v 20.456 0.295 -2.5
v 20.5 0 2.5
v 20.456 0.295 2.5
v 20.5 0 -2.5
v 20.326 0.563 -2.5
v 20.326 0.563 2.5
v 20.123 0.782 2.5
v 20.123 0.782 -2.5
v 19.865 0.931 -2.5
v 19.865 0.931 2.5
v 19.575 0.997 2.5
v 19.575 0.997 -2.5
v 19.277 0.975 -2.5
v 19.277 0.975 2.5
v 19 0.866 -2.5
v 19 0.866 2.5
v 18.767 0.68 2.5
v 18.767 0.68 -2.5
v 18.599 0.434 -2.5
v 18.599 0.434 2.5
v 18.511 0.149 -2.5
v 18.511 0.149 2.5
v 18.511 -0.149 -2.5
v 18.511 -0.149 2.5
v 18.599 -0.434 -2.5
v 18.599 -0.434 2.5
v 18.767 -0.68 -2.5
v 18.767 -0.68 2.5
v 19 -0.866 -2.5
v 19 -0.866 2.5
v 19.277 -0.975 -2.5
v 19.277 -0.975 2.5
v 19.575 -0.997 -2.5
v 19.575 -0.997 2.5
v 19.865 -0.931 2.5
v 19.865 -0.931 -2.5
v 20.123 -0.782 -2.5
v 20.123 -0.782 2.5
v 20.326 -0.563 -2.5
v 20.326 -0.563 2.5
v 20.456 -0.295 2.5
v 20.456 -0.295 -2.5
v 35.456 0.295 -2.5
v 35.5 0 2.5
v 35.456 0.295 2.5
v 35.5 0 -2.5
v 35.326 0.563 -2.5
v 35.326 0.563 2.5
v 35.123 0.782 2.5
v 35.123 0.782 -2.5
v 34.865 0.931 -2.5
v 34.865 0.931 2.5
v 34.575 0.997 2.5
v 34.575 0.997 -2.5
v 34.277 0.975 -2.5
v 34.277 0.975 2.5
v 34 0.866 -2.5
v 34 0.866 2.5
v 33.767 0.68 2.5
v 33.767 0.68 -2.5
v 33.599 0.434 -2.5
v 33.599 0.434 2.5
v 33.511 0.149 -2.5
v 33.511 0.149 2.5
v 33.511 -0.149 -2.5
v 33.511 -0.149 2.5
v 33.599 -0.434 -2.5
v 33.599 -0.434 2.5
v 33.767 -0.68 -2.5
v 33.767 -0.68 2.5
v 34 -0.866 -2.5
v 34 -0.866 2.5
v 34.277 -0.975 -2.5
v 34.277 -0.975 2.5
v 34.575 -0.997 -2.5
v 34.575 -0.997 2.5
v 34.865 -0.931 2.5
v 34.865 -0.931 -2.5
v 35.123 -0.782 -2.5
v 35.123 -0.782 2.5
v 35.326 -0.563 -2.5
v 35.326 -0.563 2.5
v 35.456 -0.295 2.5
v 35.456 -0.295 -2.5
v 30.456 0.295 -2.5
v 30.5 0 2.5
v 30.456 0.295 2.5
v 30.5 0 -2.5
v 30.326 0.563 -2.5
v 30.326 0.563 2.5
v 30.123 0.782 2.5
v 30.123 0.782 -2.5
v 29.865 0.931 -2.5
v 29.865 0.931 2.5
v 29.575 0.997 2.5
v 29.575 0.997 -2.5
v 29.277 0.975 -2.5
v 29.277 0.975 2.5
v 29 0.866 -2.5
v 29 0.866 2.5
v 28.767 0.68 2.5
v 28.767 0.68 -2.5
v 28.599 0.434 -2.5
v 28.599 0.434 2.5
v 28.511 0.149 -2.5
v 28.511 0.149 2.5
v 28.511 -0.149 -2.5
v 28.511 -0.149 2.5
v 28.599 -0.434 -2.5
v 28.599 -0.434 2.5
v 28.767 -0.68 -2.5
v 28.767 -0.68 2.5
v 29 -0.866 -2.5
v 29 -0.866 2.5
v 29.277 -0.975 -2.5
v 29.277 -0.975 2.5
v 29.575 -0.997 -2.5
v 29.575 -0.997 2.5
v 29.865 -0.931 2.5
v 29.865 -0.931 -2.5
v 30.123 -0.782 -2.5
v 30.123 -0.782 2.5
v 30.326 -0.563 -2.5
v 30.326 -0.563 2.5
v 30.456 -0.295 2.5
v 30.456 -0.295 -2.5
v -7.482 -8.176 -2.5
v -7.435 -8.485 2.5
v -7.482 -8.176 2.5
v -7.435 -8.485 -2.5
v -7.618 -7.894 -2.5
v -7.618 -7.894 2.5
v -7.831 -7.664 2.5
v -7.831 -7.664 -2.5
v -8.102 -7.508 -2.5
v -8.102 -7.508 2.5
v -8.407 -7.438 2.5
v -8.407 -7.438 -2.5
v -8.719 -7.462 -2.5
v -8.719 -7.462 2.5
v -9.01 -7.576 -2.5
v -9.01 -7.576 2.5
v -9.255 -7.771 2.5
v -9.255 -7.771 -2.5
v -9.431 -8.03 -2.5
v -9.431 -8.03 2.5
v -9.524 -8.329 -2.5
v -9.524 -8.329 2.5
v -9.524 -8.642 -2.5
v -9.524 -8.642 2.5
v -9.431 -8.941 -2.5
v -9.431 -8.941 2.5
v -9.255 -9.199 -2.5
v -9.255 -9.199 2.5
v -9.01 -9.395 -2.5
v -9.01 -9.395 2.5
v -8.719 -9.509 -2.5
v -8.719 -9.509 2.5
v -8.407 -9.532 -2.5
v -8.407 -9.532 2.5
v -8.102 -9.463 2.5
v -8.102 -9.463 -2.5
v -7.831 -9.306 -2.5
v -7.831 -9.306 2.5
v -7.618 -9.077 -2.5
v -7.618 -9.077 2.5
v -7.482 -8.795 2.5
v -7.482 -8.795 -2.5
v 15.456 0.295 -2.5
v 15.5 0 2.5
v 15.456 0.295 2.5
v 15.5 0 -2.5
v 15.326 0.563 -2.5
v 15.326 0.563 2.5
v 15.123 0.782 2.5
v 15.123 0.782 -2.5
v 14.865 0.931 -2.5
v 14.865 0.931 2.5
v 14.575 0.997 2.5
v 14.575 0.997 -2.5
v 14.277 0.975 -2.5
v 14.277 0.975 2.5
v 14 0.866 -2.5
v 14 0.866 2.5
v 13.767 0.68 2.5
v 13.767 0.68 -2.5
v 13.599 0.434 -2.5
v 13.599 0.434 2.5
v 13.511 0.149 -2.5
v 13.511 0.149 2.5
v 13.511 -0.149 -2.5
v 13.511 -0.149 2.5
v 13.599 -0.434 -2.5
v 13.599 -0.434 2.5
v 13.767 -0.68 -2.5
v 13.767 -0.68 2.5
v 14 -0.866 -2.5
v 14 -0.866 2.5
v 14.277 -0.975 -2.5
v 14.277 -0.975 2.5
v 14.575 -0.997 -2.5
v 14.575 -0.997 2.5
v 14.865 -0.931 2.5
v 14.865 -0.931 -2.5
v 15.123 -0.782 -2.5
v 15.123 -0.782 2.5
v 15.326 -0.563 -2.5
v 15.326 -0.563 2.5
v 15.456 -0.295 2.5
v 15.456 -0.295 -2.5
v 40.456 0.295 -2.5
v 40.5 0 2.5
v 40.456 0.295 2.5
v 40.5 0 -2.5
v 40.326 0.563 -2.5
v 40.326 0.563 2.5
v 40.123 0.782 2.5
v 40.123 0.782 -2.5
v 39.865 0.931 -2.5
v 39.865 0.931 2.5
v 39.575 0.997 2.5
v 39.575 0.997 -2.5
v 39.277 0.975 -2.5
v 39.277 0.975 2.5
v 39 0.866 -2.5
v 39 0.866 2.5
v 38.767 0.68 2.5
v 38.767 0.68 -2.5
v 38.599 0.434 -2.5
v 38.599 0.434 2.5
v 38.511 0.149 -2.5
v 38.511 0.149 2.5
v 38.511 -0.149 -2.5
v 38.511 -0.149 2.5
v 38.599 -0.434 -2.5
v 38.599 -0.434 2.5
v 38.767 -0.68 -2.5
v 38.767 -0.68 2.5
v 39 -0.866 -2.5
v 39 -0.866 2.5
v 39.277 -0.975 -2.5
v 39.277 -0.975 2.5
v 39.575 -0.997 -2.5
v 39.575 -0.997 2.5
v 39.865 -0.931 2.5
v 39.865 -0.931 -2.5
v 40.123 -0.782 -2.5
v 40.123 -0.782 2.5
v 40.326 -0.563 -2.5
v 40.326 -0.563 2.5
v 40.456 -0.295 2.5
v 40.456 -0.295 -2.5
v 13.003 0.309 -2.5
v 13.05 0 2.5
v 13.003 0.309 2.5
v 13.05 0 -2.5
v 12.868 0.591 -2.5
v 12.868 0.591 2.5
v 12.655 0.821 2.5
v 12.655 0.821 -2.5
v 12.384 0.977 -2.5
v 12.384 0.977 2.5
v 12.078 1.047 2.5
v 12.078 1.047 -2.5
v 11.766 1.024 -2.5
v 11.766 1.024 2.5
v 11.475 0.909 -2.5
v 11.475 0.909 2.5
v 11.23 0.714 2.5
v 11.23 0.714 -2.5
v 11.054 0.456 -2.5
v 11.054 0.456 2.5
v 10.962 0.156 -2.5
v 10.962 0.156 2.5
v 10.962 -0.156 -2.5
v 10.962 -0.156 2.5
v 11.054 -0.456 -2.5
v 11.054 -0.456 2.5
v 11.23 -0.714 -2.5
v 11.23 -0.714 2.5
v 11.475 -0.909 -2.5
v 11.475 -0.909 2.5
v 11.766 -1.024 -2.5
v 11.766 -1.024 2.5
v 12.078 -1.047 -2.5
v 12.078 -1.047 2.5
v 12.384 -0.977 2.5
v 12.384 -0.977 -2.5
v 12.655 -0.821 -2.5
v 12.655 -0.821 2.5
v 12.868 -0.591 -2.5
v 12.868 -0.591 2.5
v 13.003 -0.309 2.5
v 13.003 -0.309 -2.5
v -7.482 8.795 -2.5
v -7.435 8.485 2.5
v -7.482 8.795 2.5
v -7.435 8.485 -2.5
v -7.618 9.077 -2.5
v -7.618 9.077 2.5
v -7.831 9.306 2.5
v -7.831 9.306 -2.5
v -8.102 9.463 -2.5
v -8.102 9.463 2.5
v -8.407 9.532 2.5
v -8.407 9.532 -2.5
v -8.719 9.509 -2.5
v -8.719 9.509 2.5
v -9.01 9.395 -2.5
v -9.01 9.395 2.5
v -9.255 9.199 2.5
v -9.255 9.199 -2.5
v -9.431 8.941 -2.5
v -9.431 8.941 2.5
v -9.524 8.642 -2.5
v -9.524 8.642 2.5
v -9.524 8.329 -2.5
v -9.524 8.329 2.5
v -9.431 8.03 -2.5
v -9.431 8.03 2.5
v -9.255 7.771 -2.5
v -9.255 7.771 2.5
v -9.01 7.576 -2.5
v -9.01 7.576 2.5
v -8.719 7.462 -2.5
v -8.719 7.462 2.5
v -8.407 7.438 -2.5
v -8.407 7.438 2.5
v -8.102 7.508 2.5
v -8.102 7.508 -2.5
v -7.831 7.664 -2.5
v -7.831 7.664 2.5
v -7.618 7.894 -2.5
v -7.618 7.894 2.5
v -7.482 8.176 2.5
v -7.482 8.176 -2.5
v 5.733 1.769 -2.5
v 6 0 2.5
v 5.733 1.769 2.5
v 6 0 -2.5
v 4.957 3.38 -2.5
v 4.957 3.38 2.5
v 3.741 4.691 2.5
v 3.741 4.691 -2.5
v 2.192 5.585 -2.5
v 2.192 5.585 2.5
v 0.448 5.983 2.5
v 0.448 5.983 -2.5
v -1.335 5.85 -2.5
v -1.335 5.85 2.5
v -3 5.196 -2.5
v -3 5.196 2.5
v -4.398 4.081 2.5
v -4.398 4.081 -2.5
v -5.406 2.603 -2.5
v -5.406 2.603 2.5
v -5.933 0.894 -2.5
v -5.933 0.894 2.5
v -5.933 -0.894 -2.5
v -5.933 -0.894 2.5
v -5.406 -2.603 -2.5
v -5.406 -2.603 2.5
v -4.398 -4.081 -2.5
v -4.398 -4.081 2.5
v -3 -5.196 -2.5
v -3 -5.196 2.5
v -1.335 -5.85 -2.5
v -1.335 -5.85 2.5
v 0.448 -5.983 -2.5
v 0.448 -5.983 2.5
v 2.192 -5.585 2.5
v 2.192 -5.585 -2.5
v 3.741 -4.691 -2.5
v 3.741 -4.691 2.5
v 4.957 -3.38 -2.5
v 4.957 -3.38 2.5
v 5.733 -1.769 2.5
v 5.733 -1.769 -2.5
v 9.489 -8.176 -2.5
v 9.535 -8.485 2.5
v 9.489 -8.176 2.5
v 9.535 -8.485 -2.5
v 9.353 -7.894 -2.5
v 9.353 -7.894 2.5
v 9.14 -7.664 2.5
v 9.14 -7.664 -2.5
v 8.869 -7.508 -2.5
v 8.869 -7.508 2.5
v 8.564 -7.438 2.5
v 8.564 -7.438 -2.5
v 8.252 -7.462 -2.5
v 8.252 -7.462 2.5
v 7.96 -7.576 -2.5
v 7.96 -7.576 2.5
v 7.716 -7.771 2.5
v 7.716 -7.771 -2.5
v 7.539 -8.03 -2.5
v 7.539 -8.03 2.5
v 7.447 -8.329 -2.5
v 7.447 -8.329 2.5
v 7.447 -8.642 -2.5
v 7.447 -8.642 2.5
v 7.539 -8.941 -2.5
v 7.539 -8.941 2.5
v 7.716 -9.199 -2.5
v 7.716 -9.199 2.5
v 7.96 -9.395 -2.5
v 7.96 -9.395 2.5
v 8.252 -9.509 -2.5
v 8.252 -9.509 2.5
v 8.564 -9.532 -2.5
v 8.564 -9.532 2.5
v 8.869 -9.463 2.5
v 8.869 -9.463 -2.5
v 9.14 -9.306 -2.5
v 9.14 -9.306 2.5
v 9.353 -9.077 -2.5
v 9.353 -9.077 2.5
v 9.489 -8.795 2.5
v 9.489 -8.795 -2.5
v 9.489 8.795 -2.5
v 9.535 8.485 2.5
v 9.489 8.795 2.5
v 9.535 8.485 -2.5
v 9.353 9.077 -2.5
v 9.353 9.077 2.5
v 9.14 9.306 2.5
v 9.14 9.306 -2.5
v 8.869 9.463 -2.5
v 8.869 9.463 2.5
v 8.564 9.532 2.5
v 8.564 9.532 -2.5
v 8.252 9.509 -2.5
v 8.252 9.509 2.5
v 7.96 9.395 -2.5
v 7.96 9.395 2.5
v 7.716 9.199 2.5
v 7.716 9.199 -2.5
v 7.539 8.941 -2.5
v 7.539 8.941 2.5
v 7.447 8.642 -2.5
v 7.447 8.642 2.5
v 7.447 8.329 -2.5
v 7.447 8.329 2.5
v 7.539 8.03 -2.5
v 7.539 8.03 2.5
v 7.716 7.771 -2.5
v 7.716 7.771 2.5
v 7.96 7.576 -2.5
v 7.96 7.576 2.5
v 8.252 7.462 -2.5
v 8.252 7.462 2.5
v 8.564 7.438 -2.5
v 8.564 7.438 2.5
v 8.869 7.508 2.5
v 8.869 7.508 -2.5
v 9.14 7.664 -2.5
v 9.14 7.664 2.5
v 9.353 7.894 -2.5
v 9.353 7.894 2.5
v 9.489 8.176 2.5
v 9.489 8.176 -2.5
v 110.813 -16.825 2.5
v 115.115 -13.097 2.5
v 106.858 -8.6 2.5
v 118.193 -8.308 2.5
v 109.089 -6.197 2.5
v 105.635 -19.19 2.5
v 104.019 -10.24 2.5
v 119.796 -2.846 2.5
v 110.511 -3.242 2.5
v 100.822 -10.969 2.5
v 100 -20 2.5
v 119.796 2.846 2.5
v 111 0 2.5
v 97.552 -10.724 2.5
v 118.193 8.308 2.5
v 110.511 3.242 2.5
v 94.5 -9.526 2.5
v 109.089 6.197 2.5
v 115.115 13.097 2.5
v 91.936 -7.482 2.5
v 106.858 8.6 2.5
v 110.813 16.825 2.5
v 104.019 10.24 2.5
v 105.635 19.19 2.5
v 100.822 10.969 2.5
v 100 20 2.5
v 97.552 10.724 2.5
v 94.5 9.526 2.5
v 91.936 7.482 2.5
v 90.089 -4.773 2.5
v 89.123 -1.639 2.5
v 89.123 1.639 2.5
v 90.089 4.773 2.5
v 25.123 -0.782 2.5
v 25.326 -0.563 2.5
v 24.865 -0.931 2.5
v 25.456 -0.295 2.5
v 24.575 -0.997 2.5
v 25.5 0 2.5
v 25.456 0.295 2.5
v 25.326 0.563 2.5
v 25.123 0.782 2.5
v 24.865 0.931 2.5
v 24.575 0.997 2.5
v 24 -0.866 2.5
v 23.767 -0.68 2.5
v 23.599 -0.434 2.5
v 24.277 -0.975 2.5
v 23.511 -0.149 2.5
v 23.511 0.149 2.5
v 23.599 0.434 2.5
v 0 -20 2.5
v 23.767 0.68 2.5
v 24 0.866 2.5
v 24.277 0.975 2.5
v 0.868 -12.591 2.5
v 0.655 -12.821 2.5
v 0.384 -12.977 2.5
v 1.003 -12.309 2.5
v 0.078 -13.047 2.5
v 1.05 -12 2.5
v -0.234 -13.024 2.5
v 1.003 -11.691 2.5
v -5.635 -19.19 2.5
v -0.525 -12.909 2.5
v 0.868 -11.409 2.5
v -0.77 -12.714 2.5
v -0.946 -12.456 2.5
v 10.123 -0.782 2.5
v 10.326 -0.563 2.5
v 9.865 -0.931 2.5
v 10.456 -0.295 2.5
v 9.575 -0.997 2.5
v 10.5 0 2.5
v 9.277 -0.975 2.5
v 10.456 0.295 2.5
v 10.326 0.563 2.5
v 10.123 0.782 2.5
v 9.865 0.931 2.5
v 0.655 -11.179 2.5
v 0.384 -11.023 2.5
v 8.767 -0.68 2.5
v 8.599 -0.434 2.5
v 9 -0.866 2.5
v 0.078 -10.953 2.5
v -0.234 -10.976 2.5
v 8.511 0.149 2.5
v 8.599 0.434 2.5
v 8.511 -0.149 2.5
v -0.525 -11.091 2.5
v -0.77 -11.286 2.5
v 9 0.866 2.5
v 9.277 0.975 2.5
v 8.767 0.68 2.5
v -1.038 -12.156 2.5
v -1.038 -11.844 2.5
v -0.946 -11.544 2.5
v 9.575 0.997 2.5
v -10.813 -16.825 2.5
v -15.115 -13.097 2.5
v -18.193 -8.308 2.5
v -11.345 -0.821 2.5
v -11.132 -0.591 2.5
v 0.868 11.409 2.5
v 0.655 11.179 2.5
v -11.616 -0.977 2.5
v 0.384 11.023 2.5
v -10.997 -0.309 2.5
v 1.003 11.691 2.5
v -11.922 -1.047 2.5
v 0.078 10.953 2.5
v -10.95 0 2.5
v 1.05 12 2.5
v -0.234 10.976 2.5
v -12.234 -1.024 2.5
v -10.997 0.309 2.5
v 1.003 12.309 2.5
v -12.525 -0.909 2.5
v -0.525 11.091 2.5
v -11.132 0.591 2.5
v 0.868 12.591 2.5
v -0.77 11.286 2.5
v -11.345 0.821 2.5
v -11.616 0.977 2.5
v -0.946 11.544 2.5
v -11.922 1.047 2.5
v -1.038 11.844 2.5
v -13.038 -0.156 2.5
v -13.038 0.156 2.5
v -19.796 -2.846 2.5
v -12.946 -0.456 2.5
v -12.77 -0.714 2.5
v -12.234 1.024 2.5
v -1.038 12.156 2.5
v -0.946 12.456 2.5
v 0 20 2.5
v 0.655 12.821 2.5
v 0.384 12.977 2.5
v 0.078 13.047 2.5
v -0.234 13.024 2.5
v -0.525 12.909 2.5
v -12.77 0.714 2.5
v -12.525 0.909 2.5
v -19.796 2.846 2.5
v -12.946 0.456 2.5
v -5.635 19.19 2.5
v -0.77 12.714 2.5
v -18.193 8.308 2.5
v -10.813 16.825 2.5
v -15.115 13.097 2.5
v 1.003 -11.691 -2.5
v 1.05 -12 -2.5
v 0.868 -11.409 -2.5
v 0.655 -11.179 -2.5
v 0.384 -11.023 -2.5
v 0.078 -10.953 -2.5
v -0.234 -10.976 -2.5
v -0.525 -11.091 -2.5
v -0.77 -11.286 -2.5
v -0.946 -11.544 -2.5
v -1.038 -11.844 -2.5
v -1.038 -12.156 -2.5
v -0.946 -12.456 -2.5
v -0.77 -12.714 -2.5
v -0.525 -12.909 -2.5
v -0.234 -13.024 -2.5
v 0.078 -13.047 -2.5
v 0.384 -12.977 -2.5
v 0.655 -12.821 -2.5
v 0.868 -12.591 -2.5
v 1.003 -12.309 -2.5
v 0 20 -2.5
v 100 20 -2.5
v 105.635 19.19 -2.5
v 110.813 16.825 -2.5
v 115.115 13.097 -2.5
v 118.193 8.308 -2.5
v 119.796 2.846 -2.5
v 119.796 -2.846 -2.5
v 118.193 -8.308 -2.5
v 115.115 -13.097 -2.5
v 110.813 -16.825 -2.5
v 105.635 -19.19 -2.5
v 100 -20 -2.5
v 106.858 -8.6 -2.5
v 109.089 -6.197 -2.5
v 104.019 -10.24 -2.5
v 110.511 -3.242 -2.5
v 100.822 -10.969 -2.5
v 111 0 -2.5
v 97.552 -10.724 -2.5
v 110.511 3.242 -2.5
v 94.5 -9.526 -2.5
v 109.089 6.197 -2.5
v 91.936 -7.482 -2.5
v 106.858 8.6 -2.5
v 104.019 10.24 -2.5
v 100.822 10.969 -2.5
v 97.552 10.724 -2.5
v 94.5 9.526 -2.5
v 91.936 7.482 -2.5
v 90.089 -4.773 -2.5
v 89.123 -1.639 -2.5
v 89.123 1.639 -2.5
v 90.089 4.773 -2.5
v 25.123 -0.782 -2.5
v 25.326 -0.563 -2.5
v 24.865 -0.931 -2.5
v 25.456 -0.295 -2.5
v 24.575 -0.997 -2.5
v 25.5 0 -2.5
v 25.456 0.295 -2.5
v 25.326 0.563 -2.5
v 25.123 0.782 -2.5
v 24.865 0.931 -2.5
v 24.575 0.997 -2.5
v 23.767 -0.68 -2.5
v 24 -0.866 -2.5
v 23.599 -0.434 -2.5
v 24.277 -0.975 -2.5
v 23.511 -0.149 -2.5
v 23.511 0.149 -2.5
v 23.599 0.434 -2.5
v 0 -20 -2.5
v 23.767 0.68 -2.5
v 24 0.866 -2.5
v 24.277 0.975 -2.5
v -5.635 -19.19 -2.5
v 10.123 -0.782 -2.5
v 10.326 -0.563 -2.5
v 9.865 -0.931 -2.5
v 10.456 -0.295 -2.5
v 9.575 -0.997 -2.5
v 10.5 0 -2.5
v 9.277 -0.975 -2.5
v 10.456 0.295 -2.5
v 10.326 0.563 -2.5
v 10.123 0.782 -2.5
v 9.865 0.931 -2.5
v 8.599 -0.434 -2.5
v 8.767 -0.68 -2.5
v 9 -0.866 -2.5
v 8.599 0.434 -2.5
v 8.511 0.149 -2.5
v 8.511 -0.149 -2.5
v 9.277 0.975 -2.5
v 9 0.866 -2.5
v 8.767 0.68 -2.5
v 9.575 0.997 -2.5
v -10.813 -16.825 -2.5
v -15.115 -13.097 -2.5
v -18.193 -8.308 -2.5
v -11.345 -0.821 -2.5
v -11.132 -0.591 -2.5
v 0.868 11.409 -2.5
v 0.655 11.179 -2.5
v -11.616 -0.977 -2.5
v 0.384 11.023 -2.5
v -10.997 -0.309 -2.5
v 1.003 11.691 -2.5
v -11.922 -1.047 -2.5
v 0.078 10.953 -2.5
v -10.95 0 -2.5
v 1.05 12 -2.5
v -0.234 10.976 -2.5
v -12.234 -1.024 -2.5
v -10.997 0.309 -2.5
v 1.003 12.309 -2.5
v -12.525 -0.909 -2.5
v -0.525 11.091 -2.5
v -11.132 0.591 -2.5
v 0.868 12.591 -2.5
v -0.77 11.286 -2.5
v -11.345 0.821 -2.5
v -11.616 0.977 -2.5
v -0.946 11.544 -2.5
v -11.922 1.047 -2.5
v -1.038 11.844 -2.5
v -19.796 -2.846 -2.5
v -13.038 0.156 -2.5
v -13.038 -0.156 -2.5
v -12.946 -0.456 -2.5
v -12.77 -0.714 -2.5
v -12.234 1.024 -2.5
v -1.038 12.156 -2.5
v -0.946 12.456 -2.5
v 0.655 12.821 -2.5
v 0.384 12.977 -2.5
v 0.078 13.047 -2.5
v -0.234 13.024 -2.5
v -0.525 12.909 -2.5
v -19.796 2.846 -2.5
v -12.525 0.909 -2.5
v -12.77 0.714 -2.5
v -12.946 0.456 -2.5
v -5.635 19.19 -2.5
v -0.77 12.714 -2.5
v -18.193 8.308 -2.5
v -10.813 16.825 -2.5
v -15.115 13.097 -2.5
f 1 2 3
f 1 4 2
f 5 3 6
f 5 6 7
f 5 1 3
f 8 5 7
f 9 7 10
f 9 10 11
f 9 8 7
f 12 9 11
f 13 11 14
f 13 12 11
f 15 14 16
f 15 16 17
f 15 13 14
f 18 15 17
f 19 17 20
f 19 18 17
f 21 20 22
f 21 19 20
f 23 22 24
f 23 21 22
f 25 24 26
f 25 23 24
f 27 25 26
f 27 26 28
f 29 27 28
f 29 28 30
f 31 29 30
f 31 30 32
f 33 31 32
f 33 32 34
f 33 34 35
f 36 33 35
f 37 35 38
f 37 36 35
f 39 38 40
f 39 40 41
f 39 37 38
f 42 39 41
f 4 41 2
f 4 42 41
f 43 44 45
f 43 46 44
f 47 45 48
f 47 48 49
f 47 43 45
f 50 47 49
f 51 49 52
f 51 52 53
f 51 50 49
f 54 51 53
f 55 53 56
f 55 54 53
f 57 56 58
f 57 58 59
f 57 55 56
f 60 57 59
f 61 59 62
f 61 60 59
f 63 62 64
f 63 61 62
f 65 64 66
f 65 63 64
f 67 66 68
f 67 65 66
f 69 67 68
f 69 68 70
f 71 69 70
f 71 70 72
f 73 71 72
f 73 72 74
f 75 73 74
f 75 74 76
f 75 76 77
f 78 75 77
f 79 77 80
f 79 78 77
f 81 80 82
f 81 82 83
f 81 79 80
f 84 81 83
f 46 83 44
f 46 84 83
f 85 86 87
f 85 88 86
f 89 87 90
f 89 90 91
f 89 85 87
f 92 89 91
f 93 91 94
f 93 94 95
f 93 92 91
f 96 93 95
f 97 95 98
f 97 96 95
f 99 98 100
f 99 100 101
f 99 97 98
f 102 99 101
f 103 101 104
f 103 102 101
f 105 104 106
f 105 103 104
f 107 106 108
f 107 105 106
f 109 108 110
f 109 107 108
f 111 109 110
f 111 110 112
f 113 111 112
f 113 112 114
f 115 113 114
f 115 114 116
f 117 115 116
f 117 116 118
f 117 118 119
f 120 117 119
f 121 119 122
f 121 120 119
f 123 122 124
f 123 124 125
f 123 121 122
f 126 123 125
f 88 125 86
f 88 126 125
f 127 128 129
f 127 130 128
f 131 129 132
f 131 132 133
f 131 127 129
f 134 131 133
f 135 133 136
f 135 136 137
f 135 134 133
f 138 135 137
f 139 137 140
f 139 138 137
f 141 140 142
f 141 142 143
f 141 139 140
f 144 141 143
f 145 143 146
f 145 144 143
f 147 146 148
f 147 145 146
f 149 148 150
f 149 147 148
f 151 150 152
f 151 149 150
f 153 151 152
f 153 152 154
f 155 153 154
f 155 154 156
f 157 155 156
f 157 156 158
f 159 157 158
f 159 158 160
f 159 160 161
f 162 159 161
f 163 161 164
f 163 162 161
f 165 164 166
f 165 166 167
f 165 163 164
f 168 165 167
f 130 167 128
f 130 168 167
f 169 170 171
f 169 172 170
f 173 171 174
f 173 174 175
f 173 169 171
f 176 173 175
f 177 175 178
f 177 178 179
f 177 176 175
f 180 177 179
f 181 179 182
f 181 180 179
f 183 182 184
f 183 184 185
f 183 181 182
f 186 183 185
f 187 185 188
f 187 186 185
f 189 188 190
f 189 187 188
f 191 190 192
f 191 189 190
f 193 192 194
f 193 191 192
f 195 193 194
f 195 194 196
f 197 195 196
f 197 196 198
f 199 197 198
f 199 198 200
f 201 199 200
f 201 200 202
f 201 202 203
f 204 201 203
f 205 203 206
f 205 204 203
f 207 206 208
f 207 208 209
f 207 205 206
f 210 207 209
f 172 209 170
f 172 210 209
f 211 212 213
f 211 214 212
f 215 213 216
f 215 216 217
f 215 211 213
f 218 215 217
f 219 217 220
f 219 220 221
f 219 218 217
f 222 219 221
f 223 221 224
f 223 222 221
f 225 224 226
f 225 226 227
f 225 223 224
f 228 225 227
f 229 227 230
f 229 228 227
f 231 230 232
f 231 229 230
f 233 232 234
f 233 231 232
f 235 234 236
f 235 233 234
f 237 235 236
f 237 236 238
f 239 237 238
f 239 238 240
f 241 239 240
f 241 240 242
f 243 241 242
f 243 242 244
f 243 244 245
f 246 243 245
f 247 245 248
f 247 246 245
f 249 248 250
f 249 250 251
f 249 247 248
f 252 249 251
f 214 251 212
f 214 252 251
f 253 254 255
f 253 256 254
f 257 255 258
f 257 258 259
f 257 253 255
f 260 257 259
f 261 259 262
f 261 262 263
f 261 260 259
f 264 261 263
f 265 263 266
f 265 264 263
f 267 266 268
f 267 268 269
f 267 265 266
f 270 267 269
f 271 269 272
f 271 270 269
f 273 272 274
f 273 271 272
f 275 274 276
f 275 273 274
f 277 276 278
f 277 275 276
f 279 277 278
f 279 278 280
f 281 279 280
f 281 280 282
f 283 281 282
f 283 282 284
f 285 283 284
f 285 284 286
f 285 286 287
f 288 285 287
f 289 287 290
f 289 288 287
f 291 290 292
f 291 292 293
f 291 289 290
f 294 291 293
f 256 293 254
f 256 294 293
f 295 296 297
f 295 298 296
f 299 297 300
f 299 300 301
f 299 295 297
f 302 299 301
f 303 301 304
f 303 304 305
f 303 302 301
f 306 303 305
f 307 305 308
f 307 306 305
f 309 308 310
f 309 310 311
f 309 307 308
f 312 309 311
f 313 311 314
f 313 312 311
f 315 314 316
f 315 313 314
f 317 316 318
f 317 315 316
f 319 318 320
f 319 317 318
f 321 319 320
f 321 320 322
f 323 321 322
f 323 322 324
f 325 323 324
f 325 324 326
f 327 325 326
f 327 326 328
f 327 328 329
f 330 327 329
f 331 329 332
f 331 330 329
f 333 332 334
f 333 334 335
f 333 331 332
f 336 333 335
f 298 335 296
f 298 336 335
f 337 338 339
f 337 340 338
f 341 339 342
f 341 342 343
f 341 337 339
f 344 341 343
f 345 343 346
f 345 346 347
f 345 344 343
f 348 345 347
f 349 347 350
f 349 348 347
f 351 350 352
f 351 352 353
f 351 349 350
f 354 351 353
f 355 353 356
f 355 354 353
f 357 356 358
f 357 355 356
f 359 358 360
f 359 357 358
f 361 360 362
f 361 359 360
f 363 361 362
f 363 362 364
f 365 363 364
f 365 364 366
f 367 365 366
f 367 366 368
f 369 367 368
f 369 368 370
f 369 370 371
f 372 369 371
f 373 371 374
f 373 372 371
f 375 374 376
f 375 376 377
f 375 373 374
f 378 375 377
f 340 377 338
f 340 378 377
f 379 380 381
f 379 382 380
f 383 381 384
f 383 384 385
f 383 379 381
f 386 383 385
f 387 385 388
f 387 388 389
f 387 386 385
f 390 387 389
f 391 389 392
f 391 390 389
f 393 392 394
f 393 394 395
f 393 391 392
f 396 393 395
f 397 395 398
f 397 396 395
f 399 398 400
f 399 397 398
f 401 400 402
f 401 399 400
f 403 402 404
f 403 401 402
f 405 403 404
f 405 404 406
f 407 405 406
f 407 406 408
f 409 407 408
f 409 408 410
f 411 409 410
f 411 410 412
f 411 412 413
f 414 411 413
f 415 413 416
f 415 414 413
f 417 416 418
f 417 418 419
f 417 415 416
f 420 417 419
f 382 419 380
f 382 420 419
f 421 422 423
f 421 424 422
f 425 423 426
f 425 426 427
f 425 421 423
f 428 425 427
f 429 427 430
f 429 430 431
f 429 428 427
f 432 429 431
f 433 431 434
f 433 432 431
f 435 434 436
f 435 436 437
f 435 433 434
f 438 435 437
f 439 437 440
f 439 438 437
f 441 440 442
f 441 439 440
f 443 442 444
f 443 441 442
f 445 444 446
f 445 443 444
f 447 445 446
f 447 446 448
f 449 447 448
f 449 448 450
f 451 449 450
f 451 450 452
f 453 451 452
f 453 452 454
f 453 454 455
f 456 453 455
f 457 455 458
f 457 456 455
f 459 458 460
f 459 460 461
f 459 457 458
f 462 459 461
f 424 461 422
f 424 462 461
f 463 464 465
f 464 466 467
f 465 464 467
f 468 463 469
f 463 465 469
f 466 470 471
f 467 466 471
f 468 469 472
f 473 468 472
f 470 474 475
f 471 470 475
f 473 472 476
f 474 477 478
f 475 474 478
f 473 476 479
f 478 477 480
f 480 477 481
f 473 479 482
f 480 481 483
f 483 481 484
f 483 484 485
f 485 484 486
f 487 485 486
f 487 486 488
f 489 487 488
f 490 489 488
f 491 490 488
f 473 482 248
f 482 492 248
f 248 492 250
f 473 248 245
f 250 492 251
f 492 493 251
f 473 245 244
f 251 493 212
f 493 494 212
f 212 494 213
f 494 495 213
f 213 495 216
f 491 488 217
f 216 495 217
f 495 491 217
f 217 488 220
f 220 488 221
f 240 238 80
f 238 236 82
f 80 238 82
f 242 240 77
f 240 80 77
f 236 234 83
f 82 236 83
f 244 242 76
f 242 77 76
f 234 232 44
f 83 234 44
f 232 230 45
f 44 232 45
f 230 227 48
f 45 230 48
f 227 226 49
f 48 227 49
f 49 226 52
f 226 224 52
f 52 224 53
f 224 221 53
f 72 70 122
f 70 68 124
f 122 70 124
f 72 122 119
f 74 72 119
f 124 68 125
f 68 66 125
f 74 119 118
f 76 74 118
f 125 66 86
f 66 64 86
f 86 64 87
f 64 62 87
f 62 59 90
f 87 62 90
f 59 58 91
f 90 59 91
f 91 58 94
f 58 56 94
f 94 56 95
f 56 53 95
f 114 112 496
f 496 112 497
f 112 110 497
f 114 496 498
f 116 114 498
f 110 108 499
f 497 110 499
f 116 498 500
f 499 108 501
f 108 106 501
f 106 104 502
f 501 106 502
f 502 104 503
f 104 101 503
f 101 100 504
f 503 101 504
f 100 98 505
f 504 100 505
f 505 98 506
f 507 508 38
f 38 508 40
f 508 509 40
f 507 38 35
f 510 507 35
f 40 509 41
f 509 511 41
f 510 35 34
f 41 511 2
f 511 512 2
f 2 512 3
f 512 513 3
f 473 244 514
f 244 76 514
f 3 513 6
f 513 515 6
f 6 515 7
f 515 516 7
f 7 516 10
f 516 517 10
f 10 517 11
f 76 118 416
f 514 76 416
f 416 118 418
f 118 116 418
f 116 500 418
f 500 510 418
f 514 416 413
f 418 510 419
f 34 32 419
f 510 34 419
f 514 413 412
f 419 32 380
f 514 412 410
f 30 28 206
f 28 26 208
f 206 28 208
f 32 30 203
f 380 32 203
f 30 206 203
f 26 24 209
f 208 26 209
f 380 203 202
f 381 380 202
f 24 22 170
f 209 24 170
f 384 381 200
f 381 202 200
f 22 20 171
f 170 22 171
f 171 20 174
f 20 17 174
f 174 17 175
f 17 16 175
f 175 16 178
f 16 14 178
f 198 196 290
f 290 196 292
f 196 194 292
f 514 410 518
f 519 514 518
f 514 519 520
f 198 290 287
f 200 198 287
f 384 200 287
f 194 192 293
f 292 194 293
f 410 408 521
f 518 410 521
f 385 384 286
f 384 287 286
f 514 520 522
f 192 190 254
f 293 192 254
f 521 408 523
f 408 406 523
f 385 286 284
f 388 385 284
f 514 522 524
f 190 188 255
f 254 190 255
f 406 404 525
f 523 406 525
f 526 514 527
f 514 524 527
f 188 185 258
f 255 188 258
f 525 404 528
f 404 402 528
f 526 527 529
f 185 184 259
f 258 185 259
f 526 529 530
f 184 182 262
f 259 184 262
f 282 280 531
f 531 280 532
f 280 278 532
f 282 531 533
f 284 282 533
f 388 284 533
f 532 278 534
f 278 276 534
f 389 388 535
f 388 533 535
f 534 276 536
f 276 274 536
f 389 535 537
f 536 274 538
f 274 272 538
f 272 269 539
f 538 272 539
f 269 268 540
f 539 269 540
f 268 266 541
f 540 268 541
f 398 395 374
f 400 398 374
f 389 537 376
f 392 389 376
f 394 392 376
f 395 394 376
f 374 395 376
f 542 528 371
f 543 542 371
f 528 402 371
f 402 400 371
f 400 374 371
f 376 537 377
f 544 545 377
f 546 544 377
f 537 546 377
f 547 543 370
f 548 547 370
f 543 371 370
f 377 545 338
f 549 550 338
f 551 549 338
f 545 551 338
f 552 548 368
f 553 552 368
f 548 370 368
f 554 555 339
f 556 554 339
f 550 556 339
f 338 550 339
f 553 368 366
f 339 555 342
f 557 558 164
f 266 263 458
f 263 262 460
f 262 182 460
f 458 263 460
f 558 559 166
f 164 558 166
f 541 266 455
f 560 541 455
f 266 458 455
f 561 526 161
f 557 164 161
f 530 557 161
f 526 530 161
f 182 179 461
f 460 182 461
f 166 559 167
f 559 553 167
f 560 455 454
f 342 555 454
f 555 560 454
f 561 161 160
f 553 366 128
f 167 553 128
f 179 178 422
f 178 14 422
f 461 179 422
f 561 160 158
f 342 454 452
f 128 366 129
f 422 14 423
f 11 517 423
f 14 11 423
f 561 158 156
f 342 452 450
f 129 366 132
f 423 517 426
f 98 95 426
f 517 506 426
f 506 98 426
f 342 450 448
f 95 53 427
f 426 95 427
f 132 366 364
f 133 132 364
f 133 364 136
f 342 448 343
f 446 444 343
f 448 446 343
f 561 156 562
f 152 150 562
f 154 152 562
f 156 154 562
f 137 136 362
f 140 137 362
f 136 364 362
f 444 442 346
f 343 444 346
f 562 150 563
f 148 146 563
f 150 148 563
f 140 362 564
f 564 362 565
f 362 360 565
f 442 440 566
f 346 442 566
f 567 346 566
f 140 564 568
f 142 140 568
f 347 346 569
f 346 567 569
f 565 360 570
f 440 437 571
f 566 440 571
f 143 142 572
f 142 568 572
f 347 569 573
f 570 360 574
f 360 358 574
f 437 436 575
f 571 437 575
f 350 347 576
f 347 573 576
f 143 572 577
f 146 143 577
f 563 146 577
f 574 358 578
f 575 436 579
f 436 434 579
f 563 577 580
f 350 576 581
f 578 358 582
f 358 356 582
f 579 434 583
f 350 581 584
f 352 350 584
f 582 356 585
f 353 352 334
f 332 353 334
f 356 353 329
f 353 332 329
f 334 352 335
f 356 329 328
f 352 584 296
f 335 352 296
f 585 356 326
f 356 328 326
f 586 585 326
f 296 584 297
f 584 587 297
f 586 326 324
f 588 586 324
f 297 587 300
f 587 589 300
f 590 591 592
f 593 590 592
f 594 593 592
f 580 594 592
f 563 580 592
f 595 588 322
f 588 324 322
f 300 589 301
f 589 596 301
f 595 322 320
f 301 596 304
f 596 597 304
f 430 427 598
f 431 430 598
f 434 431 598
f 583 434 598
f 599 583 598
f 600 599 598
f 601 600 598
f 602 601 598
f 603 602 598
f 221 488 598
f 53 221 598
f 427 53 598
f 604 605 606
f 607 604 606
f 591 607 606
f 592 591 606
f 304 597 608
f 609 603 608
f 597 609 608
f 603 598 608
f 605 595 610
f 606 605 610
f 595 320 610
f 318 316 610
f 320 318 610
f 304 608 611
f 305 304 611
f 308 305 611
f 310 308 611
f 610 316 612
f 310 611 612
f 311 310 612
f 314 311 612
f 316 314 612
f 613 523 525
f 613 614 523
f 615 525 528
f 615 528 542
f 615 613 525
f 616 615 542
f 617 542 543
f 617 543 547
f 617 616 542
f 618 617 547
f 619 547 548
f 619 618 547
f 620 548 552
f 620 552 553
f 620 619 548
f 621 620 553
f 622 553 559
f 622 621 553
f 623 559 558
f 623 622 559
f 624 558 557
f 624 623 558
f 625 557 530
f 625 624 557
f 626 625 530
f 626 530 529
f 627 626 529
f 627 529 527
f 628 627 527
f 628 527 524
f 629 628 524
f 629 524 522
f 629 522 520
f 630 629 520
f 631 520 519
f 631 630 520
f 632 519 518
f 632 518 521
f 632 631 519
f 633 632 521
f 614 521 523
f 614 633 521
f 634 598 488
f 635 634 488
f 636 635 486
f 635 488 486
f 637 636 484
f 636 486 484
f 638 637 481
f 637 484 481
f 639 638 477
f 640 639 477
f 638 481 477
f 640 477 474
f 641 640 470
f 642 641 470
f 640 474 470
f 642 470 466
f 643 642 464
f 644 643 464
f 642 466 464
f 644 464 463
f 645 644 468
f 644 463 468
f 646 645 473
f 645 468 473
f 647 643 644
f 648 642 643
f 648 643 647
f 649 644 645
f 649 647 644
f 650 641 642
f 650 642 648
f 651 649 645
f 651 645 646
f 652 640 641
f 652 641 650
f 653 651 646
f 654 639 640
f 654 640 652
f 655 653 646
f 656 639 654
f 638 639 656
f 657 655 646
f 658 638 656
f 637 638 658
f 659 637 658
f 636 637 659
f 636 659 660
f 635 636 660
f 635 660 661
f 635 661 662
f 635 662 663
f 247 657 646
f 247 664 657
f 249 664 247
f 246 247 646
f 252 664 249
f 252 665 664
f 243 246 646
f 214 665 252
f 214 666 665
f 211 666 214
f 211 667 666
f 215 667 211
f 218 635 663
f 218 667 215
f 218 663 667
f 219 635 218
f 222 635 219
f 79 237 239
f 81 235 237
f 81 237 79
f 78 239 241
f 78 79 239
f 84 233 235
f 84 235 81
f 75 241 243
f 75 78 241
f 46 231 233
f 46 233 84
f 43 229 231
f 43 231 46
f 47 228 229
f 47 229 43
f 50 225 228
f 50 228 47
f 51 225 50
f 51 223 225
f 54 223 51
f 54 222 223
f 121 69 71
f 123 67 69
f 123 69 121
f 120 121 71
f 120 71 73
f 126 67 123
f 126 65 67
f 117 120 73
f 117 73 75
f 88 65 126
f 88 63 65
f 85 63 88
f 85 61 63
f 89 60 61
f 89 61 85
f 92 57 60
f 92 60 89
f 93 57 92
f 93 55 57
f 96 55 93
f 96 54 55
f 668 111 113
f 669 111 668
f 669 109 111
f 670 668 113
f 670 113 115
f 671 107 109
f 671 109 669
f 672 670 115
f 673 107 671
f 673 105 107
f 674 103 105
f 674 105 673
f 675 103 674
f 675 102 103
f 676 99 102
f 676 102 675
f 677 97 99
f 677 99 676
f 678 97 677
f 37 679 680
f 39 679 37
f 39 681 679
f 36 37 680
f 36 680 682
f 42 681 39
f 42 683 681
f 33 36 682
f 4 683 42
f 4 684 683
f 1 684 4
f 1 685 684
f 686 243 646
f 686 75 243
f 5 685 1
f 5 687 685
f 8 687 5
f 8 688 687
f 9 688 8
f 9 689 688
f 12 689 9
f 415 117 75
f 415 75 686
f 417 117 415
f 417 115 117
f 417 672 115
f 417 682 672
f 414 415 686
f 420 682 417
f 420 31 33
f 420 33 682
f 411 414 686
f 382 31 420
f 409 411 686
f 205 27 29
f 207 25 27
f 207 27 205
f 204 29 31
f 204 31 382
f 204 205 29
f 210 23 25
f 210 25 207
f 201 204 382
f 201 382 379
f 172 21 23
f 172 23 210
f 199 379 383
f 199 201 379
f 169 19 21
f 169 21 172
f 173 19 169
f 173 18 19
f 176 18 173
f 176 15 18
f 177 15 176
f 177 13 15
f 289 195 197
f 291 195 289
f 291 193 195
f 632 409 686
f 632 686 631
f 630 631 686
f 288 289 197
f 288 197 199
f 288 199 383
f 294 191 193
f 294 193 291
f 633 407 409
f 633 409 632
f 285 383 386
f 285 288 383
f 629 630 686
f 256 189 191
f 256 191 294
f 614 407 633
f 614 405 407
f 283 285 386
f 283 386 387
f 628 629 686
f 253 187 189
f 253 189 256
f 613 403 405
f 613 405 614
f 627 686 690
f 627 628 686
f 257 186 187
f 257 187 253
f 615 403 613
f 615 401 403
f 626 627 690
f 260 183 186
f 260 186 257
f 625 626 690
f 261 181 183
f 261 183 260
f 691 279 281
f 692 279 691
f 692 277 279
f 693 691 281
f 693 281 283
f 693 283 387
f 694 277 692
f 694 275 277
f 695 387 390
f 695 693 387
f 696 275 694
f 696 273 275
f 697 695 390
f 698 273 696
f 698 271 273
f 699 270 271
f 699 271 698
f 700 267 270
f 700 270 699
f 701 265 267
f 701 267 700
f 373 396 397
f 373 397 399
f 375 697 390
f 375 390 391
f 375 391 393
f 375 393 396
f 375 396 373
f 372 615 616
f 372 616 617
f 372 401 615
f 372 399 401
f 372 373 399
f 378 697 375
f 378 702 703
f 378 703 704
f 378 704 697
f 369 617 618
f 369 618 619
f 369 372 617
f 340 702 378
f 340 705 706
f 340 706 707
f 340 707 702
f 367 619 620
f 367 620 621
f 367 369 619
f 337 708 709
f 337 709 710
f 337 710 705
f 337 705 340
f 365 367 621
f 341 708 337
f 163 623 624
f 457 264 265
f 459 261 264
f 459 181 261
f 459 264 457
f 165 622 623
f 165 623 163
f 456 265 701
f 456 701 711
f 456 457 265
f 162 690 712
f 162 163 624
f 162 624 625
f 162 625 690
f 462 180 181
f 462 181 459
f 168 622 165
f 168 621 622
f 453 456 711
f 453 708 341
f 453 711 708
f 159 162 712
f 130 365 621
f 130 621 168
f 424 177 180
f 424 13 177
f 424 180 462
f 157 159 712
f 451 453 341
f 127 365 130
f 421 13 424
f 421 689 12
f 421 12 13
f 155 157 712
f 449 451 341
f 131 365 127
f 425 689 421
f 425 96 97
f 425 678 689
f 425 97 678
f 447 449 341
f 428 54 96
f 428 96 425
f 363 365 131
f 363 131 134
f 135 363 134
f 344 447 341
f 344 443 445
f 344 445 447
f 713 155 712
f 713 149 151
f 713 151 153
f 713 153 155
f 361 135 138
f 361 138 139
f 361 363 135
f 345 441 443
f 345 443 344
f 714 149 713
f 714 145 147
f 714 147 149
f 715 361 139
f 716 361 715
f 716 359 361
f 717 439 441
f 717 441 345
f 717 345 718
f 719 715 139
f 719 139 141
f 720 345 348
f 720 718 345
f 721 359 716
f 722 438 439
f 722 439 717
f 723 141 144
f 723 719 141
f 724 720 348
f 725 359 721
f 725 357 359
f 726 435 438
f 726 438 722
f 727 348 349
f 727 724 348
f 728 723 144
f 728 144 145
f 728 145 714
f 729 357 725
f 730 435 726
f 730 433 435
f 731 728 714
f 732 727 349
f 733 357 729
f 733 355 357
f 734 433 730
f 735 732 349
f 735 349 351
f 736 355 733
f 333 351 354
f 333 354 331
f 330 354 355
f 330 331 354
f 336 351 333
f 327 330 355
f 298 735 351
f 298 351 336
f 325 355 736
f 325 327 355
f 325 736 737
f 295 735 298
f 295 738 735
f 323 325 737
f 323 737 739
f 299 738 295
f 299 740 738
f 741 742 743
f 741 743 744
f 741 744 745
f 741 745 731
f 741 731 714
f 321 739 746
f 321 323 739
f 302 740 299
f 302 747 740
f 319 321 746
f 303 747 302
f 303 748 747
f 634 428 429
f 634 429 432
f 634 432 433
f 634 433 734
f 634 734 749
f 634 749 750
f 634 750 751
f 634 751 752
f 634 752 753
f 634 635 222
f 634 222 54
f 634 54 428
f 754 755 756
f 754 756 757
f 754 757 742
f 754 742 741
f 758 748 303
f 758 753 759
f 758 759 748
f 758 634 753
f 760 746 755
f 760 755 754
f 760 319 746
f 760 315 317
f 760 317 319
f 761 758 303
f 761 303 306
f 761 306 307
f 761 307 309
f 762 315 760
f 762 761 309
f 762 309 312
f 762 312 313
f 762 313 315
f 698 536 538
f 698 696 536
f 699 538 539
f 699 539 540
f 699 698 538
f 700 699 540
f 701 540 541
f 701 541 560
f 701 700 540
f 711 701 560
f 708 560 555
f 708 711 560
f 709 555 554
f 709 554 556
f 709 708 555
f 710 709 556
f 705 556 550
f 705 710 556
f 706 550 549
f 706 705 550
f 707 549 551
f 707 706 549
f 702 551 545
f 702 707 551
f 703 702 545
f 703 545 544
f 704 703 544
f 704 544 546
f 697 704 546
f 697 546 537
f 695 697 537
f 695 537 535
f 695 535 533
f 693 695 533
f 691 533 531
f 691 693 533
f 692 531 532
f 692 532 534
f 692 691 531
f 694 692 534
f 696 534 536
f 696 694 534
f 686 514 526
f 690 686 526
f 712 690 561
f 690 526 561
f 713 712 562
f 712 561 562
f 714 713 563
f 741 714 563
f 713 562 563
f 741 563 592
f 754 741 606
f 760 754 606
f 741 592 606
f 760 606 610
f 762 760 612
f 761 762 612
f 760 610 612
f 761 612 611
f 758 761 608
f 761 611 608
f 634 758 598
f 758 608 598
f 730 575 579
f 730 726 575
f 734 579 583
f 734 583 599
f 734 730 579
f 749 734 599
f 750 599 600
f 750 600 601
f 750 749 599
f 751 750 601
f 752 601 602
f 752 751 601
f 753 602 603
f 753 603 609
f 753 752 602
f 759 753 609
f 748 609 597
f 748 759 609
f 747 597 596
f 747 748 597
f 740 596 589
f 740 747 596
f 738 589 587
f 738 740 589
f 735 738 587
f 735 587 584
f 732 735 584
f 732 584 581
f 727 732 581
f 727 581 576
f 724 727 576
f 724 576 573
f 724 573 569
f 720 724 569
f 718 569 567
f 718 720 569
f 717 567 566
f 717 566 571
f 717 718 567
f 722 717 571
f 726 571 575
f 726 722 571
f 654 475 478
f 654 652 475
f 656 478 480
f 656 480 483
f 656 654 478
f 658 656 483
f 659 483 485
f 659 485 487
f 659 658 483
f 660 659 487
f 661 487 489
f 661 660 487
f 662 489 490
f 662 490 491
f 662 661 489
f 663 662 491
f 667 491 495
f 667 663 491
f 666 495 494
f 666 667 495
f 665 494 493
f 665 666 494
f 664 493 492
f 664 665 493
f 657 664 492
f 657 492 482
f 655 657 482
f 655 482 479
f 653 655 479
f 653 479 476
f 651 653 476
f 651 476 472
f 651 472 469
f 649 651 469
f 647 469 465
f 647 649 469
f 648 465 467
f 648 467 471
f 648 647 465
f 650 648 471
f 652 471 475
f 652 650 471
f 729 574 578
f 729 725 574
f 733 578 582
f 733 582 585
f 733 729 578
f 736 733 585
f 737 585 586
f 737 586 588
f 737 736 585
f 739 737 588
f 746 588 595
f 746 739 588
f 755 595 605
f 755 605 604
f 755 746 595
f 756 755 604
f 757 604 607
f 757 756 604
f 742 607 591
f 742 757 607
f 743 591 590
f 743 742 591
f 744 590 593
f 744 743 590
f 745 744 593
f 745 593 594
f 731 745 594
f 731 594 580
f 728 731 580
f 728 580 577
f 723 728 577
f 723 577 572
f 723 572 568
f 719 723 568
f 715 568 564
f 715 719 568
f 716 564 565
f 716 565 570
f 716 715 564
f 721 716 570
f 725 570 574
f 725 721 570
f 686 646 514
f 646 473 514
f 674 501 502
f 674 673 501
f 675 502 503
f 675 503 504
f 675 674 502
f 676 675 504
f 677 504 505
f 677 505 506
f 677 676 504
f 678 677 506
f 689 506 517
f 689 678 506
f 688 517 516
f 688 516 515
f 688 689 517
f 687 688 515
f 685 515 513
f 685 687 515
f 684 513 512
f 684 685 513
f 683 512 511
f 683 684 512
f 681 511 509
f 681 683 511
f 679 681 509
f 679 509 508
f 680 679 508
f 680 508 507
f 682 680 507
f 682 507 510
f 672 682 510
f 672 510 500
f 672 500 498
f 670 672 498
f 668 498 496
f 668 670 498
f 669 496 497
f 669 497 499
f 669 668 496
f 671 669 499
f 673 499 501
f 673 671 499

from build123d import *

# Parameters (mm, degrees)
SKETCH1_R           = 6
SKETCH1_R_2         = 1
SKETCH1_R_3         = 11
SKETCH1_R_4         = 1.05
BOSS_EXTRUDE1_DEPTH = 2.5


with BuildPart() as part:
    # Sketch1 → Boss-Extrude1 (new, symmetric)
    with BuildSketch(Plane.XY):
        with BuildLine():
            Line((0, 20), (100, 20))
            ThreePointArc((100, 20), (120, 0), (100, -20))
            Line((100, -20), (0, -20))
            ThreePointArc((0, -20), (-20, 0), (0, 20))
        make_face()
        Circle(SKETCH1_R, mode=Mode.SUBTRACT)
        with Locations((9.5, 0)):
            Circle(SKETCH1_R_2, mode=Mode.SUBTRACT)
        with Locations((14.5, 0)):
            Circle(SKETCH1_R_2, mode=Mode.SUBTRACT)
        with Locations((19.5, 0)):
            Circle(SKETCH1_R_2, mode=Mode.SUBTRACT)
        with Locations((24.5, 0)):
            Circle(SKETCH1_R_2, mode=Mode.SUBTRACT)
        with Locations((29.5, 0)):
            Circle(SKETCH1_R_2, mode=Mode.SUBTRACT)
        with Locations((34.5, 0)):
            Circle(SKETCH1_R_2, mode=Mode.SUBTRACT)
        with Locations((39.5, 0)):
            Circle(SKETCH1_R_2, mode=Mode.SUBTRACT)
        with Locations((100, 0)):
            Circle(SKETCH1_R_3, mode=Mode.SUBTRACT)
        with Locations((0, 12)):
            Circle(SKETCH1_R_4, mode=Mode.SUBTRACT)
        with Locations((8.485281374, 8.485281374)):
            Circle(SKETCH1_R_4, mode=Mode.SUBTRACT)
        with Locations((12, 0)):
            Circle(SKETCH1_R_4, mode=Mode.SUBTRACT)
        with Locations((8.485281374, -8.485281374)):
            Circle(SKETCH1_R_4, mode=Mode.SUBTRACT)
        with Locations((0, -12)):
            Circle(SKETCH1_R_4, mode=Mode.SUBTRACT)
        with Locations((-8.485281374, -8.485281374)):
            Circle(SKETCH1_R_4, mode=Mode.SUBTRACT)
        with Locations((-12, 0)):
            Circle(SKETCH1_R_4, mode=Mode.SUBTRACT)
        with Locations((-8.485281374, 8.485281374)):
            Circle(SKETCH1_R_4, mode=Mode.SUBTRACT)
    extrude(amount=BOSS_EXTRUDE1_DEPTH, both=True)


solid = part.part
